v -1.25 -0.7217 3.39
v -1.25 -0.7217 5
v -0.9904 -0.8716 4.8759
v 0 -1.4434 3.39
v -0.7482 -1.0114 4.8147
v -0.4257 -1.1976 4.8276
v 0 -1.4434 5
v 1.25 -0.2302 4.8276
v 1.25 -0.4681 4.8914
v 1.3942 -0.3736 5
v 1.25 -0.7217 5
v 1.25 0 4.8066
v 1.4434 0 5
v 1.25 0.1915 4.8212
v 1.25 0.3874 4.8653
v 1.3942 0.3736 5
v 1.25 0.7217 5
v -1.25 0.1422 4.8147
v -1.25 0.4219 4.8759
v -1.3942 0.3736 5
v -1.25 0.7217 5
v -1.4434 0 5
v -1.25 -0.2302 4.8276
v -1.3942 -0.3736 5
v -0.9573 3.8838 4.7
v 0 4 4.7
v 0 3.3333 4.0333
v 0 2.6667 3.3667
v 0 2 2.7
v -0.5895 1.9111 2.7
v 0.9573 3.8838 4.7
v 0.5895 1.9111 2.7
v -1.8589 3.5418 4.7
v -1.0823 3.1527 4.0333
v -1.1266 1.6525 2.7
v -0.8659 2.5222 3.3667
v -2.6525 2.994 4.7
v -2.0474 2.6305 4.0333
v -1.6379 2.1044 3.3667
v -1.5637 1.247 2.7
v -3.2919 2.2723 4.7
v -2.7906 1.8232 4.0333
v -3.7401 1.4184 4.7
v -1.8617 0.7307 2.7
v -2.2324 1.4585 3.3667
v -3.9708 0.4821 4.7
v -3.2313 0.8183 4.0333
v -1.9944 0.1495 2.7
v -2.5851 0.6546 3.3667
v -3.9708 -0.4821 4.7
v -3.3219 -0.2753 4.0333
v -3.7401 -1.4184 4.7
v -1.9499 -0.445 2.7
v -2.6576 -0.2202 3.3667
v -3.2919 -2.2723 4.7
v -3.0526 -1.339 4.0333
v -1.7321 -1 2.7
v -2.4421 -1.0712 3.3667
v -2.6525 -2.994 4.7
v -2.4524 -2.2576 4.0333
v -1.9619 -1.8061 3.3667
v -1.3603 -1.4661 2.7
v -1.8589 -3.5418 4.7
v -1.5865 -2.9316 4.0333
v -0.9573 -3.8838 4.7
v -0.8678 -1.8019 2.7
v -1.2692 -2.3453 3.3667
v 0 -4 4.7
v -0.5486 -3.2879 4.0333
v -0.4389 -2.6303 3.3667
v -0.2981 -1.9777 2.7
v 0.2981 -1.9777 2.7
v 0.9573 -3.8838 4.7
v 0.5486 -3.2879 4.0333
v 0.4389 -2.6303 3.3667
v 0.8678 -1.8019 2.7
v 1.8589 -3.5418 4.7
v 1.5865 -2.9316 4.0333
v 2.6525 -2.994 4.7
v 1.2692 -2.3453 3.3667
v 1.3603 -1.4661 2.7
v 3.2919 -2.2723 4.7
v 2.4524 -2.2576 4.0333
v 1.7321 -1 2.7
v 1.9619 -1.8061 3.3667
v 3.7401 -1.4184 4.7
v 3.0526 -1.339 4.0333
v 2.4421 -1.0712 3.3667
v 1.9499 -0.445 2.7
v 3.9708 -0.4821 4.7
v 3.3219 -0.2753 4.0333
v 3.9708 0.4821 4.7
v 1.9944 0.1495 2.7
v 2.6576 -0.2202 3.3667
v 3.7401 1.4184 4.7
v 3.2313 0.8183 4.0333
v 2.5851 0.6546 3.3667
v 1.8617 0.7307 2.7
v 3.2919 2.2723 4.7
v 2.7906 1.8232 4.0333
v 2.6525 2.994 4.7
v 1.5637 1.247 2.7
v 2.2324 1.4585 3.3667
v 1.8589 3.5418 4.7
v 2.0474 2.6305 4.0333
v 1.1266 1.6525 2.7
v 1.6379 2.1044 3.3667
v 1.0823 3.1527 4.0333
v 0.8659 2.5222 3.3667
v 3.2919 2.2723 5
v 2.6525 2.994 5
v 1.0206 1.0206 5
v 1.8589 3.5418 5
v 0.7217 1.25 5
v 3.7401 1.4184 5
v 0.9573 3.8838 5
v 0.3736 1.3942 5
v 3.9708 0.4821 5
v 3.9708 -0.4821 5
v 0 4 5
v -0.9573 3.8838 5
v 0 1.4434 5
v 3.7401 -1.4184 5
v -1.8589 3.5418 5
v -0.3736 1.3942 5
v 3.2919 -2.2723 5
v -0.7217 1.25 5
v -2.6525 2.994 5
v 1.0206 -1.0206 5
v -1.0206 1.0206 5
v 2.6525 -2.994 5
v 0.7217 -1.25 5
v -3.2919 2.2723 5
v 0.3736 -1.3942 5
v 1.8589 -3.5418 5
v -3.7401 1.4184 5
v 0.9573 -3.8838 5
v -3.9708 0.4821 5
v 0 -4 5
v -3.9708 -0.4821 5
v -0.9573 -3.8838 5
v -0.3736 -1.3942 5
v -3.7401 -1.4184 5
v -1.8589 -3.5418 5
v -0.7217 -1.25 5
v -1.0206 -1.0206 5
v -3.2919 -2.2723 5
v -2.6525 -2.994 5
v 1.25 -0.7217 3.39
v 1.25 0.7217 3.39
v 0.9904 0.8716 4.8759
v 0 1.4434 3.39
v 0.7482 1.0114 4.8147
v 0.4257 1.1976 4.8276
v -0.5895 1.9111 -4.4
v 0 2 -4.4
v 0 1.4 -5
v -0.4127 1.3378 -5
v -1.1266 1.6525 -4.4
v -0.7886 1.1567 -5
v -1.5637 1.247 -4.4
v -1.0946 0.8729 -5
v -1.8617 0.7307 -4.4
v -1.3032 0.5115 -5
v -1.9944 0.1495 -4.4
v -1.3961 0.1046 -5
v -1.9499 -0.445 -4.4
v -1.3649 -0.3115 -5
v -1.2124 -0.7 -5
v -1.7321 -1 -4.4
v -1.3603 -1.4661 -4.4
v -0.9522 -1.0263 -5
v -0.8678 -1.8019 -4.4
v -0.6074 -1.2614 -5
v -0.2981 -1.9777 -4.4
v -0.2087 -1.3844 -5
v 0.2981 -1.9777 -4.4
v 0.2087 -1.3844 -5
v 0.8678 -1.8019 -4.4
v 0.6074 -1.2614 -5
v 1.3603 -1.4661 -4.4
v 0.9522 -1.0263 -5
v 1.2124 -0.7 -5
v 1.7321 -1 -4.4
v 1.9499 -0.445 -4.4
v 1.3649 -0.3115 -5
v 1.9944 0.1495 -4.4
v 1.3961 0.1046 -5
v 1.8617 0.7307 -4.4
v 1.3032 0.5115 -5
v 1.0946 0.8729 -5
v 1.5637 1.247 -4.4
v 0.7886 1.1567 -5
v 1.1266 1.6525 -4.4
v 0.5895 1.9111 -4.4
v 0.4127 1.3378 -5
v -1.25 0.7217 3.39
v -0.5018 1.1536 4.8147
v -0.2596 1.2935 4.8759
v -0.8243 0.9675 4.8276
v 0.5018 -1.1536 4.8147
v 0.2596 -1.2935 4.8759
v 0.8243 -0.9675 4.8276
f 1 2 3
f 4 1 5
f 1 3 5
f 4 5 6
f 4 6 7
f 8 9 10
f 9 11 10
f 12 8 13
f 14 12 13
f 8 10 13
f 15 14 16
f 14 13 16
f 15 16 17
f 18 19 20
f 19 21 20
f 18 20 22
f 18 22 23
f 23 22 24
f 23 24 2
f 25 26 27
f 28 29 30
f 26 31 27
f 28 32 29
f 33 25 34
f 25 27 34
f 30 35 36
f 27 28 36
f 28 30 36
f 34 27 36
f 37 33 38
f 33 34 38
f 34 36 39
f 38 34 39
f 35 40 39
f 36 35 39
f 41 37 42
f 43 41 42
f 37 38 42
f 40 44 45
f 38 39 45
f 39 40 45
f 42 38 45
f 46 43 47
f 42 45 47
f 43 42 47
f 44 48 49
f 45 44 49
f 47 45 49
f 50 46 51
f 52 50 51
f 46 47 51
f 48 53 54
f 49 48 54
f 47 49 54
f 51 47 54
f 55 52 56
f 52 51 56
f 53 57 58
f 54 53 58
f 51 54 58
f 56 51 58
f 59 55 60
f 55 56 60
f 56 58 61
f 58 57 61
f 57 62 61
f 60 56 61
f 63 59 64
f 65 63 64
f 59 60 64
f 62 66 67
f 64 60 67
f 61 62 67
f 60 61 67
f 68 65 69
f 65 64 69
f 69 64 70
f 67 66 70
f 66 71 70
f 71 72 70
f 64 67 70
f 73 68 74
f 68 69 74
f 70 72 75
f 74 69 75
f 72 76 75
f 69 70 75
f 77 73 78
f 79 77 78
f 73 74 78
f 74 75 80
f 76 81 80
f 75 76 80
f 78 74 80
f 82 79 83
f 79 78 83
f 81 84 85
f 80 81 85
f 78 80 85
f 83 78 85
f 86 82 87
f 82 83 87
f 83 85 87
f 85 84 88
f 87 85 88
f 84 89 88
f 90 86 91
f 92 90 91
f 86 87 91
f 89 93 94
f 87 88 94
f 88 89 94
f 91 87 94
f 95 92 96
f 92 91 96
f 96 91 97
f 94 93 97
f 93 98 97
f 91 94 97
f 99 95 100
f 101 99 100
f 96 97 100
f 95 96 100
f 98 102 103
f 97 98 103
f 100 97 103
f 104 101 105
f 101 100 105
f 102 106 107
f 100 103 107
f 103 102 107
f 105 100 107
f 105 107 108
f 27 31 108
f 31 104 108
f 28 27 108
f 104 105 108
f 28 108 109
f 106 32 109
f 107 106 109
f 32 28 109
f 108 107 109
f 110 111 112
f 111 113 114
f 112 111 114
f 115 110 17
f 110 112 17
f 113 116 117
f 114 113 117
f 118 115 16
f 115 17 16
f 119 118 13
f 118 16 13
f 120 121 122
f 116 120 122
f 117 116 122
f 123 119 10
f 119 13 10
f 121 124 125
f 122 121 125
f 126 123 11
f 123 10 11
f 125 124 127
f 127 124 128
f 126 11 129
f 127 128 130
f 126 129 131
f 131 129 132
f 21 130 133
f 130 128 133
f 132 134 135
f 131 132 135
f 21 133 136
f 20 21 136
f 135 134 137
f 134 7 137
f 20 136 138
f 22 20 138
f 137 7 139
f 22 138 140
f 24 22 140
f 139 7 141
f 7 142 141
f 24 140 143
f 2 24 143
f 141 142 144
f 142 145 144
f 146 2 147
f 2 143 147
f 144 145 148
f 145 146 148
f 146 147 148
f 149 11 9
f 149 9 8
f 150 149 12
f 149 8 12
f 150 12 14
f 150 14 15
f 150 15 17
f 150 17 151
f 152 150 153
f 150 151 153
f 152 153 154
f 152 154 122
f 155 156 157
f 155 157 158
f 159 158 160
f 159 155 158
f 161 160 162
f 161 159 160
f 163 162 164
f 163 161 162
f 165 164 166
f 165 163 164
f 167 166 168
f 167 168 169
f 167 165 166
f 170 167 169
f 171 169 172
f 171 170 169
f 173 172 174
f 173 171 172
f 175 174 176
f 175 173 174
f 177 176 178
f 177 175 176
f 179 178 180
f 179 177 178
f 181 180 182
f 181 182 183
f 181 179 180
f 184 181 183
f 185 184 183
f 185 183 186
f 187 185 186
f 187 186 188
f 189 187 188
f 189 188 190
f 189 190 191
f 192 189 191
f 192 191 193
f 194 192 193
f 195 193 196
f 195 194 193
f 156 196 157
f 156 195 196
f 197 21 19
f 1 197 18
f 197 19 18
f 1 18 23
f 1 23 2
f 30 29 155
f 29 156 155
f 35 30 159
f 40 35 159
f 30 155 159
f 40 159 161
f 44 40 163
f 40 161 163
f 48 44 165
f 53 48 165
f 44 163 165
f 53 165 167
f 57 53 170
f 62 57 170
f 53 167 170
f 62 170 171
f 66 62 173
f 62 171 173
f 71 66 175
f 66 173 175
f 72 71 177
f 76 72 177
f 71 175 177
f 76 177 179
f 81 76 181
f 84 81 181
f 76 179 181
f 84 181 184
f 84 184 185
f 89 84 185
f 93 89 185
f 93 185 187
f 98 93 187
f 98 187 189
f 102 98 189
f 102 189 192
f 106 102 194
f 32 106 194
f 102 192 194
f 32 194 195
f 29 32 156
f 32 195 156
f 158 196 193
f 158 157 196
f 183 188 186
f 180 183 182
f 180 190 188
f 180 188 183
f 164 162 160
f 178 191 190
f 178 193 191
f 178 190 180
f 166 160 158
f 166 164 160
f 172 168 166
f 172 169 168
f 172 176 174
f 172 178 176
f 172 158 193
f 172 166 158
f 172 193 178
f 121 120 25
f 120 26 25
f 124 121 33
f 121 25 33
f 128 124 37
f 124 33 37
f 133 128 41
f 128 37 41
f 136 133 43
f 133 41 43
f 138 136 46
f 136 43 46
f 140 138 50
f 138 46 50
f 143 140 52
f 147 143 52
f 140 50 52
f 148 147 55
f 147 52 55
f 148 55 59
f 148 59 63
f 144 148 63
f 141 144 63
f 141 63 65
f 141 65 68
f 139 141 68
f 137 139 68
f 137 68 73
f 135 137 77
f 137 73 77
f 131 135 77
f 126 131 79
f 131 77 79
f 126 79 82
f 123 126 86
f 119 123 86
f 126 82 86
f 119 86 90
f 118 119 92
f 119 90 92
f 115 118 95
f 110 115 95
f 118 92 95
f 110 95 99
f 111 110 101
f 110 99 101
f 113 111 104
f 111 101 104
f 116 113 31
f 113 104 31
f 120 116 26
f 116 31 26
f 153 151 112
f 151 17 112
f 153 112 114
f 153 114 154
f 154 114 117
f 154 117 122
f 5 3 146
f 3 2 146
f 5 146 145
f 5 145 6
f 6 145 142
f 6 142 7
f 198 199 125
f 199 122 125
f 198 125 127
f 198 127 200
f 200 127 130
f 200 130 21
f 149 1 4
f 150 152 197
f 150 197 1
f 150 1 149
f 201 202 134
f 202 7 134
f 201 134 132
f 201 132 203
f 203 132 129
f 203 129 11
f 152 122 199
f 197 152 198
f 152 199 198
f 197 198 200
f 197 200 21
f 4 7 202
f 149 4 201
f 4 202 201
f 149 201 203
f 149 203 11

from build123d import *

# Parameters (mm, degrees)
SKETCH3_W          = 10
SKETCH3_H          = 2
CHAMFER1_SIZE      = 0.6
CUT_EXTRUDE1_DEPTH = 1.61
SKETCH9_R          = 1.443375673
CUT_EXTRUDE2_DEPTH = 1.61
CUT_EXTRUDE2_DRAFT = -45


with BuildPart() as part:
    # Sketch3 → Revolve1 (revolve)
    with BuildSketch(Plane(origin=(0, 0, 0), x_dir=(0, 0, -1), z_dir=(1, 0, 0))):
        with Locations((0, 1)):
            Rectangle(SKETCH3_W, SKETCH3_H)
    revolve(axis=Axis((0, 0, -5), (0, 0, 1)))

    # Chamfer1
    chamfer1_edges = [part.edges().sort_by_distance(p)[0] for p in [
        (0, -2, -5),
    ]]
    chamfer(chamfer1_edges, length=CHAMFER1_SIZE)

    # Sketch6 → Revolve2 (revolve)
    with BuildSketch(Plane(origin=(0, 0, 0), x_dir=(0, 0, -1), z_dir=(1, 0, 0))):
        Polygon((-5, 4), (-4.7, 4), (-2.7, 2), (-2.7, 0), (-5, 0), align=None)
    revolve(axis=Axis((0, 0, -5), (0, 0, 1)))

    # Sketch8 → Cut-Extrude1 (cut)
    with BuildSketch(Plane.XY.offset(5)):
        Polygon((0, 1.443375673), (-1.25, 0.721687836), (-1.25, -0.721687836), (0, -1.443375673), (1.25, -0.721687836), (1.25, 0.721687836), align=None)
    extrude(amount=-CUT_EXTRUDE1_DEPTH, mode=Mode.SUBTRACT)


with BuildPart() as cut_extrude2_tool:
    # Sketch9 → Cut-Extrude2 (with draft: the straight prism first)
    with BuildSketch(Plane.XY.offset(5)):
        Circle(SKETCH9_R)
    extrude(amount=-CUT_EXTRUDE2_DEPTH)
    # Cut-Extrude2: the draft: its side faces are tilted about the plane it starts from
    cut_extrude2_sides = [cut_extrude2_tool.faces().sort_by_distance(p)[0] for p in [
        (-1.443375673, 0, 4.195),
    ]]
    draft(cut_extrude2_sides, Plane.XY.offset(5), CUT_EXTRUDE2_DRAFT)


with BuildPart() as part_1:
    add(part.part)

    # Cut-Extrude2: cut by cut_extrude2_tool
    add(cut_extrude2_tool.part, mode=Mode.SUBTRACT)


solid = part_1.part
